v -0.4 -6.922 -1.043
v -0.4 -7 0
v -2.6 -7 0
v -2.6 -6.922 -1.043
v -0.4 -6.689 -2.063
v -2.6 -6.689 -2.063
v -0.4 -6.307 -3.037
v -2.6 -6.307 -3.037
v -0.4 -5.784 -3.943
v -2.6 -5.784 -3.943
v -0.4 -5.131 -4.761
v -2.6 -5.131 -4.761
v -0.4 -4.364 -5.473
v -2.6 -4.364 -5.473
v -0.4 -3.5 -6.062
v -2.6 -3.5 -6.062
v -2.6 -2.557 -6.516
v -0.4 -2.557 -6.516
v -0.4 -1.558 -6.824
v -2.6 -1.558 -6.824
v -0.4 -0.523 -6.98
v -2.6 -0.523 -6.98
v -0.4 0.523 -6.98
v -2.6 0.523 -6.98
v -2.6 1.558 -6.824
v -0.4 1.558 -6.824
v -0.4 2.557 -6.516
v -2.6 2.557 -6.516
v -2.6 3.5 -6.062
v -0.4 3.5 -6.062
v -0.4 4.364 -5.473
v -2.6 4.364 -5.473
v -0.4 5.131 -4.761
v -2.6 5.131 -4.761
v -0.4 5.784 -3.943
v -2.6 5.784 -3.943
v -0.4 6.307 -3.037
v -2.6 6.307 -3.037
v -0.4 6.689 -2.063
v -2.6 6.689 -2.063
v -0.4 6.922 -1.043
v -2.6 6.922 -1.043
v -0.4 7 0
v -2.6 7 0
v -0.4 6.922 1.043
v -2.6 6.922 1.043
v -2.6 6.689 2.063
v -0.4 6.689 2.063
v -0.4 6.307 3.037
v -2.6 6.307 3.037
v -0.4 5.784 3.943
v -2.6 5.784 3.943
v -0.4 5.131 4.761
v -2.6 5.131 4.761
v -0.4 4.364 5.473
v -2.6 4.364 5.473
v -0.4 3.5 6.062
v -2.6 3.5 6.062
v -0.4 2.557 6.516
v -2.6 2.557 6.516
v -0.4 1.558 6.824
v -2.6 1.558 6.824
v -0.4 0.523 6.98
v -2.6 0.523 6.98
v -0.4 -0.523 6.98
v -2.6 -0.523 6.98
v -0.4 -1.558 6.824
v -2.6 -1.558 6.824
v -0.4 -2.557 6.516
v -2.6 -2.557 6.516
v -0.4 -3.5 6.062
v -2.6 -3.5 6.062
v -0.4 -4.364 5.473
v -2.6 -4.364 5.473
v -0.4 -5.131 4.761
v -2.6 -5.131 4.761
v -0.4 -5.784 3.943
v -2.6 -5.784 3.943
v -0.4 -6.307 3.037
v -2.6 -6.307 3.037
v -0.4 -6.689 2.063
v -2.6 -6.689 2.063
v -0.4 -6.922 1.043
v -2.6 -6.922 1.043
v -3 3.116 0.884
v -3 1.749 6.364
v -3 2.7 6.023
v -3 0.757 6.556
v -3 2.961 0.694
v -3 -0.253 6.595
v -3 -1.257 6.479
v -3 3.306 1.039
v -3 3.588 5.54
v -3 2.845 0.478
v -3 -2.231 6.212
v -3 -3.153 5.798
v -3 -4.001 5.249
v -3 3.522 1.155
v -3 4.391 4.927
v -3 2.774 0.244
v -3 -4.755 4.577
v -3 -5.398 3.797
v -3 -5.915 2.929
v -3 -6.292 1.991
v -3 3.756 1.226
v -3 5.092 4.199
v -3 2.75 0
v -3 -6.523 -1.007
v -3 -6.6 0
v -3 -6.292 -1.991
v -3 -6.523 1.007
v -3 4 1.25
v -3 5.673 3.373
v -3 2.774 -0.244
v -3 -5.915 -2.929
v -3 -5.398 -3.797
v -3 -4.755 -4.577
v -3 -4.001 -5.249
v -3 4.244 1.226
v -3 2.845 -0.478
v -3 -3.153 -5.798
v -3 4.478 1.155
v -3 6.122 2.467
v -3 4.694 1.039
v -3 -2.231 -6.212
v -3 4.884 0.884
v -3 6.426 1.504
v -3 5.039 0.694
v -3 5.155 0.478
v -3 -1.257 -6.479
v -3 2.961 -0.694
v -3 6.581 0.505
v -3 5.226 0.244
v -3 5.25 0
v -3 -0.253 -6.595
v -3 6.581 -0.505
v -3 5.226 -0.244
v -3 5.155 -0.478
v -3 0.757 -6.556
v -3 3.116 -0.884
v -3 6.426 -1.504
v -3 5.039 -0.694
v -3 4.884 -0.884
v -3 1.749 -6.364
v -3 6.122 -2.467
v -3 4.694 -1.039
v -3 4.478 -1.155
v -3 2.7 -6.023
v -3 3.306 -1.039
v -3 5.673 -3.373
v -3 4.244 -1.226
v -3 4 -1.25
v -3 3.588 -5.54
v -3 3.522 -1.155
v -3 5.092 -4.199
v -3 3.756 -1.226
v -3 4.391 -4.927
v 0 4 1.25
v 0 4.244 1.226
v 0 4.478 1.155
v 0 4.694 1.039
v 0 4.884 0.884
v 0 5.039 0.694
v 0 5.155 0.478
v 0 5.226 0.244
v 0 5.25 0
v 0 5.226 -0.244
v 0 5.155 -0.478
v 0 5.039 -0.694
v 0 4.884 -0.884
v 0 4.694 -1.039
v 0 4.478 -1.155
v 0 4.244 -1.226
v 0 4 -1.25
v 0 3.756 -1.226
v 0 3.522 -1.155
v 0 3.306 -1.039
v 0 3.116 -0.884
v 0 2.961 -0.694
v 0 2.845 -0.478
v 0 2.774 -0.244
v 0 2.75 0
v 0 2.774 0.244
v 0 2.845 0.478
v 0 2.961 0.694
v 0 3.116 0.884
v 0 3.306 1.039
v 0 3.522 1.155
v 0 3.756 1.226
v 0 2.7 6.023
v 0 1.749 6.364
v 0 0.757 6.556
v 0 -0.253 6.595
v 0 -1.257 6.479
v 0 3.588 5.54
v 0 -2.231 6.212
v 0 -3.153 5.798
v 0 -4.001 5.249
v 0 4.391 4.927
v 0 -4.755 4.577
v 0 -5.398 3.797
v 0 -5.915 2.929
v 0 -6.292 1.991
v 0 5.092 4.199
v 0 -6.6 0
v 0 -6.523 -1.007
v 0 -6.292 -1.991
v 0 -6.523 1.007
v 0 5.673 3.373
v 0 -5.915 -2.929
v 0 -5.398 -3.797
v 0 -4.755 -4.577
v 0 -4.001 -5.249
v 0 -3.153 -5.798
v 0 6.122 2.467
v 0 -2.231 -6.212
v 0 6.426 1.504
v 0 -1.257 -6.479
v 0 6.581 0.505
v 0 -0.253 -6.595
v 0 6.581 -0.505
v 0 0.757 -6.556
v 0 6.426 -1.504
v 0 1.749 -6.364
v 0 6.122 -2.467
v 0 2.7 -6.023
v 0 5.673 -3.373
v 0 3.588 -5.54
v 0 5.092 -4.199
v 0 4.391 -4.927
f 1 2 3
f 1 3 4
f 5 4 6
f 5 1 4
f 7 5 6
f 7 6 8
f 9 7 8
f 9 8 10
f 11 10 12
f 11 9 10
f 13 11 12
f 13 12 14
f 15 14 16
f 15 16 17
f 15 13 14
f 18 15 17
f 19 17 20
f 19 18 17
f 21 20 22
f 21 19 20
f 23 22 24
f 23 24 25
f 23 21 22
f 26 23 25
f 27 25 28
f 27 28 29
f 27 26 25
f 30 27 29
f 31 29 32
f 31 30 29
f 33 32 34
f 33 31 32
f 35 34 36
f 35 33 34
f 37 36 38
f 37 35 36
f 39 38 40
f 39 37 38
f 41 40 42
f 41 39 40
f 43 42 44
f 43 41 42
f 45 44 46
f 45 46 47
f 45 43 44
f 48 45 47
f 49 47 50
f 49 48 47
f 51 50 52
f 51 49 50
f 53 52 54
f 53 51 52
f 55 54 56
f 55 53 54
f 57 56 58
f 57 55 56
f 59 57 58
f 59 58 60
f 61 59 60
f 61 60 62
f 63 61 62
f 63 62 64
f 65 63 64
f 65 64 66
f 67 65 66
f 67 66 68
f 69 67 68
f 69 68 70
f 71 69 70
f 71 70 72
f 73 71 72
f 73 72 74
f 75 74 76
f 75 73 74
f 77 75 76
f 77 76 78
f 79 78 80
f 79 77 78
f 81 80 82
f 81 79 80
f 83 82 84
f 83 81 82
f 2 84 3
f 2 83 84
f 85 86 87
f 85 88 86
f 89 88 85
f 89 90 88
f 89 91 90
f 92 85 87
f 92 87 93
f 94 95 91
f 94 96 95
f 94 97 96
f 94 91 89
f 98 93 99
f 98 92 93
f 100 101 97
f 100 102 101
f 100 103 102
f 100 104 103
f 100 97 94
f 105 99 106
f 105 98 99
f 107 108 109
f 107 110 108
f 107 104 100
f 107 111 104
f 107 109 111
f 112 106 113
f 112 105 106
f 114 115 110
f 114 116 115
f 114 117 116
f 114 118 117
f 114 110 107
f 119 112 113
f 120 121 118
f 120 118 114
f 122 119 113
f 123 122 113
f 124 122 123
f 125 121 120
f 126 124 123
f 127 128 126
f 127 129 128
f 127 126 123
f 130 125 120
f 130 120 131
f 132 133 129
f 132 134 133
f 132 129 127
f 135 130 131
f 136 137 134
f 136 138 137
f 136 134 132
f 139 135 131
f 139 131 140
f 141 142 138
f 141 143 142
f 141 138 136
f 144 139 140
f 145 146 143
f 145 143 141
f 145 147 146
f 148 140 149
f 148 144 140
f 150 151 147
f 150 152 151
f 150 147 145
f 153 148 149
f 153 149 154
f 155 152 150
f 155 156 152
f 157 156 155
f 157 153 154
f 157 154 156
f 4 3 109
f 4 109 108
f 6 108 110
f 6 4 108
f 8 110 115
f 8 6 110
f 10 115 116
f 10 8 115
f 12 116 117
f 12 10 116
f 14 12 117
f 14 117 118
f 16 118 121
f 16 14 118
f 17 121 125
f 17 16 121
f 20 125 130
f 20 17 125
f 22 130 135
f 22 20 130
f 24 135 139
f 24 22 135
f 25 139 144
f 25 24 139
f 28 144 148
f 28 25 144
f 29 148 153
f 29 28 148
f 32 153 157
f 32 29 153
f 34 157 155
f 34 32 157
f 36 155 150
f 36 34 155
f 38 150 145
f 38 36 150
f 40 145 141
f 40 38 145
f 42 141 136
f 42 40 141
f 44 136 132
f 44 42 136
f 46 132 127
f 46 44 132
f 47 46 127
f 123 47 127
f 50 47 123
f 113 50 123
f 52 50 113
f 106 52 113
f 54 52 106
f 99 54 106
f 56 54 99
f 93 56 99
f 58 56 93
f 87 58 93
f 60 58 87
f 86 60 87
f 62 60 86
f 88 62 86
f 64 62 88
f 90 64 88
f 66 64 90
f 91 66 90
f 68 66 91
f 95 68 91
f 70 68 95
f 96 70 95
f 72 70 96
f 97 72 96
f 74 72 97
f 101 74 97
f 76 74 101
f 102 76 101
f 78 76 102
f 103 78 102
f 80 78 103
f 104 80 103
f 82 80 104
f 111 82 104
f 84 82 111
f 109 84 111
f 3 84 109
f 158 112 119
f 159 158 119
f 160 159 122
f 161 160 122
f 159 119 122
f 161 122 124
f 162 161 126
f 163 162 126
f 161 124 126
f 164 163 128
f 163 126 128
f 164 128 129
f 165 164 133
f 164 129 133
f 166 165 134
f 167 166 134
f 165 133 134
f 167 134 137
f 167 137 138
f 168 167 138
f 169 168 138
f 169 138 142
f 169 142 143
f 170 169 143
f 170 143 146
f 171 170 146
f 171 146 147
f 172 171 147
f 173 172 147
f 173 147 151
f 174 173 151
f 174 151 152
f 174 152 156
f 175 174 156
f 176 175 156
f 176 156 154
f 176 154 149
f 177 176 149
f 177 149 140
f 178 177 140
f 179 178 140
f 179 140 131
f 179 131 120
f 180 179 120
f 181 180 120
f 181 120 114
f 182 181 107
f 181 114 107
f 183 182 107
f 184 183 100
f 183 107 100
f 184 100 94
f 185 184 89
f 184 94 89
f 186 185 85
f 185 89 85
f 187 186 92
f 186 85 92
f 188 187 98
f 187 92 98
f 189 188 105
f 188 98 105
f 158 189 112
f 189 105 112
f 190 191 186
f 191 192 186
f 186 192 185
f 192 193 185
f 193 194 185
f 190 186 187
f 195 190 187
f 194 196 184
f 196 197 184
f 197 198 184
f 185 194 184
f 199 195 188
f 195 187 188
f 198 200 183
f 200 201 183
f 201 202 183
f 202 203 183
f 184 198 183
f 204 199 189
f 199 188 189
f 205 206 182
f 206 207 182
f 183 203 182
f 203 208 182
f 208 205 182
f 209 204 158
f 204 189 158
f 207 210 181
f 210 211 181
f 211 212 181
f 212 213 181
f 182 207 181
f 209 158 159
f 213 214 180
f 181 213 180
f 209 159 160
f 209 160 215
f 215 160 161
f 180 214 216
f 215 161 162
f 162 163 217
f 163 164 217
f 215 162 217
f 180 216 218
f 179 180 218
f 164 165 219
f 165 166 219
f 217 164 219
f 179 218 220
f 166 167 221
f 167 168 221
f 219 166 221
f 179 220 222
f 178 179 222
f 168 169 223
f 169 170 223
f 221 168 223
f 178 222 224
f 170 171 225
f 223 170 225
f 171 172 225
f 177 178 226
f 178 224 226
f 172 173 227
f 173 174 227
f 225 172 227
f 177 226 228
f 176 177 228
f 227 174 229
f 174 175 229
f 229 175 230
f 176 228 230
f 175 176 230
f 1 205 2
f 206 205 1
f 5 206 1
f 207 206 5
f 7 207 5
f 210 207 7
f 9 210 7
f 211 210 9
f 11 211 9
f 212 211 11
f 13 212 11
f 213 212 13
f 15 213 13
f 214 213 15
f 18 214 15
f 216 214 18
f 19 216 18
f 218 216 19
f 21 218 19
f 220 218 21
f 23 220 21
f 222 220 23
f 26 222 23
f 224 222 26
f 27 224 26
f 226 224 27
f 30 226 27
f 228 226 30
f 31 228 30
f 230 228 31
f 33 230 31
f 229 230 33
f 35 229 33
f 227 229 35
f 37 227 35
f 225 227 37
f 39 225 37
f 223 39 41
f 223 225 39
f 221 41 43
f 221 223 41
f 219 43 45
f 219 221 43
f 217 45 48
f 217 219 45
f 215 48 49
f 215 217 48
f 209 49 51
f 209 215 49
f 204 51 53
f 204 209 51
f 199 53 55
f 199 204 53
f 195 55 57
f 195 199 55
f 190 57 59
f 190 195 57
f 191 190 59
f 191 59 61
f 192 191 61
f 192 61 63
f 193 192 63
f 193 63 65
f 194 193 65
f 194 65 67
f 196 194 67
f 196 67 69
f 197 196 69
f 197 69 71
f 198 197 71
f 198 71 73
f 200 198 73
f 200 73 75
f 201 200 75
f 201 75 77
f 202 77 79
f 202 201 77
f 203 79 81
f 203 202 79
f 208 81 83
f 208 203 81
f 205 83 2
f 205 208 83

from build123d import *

# Parameters (mm, degrees)
SKETCH_2_W          = 3
SKETCH_2_H          = 7
SKETCH_3_R          = 1.25
CUT_EXTRUDE_1_DEPTH = 11.344080433
CHAMFER_1_SIZE      = 0.4


with BuildPart() as part:
    # Эскиз2 → Повернуть1 (revolve)
    with BuildSketch(Plane.XY, mode=Mode.PRIVATE) as revolve_1_sk:
        with Locations((-1.5, 3.5)):
            Rectangle(SKETCH_2_W, SKETCH_2_H)
    revolve(revolve_1_sk.sketch.rotate(Axis((-3, 0, 0), (1, 0, 0)), 180), axis=Axis((-3, 0, 0), (1, 0, 0)))

    # Эскиз3 → Вырез-Вытянуть1 (cut, through all)
    with BuildSketch(Plane.ZY.offset(3)):
        with Locations((0, 4)):
            Circle(SKETCH_3_R)
    extrude(amount=-CUT_EXTRUDE_1_DEPTH, mode=Mode.SUBTRACT)

    # Фаска1
    chamfer_1_edges = [part.edges().sort_by_distance(p)[0] for p in [
        (-3, 7, 0),
        (0, 7, 0),
    ]]
    chamfer(chamfer_1_edges, length=CHAMFER_1_SIZE)


solid = part.part
